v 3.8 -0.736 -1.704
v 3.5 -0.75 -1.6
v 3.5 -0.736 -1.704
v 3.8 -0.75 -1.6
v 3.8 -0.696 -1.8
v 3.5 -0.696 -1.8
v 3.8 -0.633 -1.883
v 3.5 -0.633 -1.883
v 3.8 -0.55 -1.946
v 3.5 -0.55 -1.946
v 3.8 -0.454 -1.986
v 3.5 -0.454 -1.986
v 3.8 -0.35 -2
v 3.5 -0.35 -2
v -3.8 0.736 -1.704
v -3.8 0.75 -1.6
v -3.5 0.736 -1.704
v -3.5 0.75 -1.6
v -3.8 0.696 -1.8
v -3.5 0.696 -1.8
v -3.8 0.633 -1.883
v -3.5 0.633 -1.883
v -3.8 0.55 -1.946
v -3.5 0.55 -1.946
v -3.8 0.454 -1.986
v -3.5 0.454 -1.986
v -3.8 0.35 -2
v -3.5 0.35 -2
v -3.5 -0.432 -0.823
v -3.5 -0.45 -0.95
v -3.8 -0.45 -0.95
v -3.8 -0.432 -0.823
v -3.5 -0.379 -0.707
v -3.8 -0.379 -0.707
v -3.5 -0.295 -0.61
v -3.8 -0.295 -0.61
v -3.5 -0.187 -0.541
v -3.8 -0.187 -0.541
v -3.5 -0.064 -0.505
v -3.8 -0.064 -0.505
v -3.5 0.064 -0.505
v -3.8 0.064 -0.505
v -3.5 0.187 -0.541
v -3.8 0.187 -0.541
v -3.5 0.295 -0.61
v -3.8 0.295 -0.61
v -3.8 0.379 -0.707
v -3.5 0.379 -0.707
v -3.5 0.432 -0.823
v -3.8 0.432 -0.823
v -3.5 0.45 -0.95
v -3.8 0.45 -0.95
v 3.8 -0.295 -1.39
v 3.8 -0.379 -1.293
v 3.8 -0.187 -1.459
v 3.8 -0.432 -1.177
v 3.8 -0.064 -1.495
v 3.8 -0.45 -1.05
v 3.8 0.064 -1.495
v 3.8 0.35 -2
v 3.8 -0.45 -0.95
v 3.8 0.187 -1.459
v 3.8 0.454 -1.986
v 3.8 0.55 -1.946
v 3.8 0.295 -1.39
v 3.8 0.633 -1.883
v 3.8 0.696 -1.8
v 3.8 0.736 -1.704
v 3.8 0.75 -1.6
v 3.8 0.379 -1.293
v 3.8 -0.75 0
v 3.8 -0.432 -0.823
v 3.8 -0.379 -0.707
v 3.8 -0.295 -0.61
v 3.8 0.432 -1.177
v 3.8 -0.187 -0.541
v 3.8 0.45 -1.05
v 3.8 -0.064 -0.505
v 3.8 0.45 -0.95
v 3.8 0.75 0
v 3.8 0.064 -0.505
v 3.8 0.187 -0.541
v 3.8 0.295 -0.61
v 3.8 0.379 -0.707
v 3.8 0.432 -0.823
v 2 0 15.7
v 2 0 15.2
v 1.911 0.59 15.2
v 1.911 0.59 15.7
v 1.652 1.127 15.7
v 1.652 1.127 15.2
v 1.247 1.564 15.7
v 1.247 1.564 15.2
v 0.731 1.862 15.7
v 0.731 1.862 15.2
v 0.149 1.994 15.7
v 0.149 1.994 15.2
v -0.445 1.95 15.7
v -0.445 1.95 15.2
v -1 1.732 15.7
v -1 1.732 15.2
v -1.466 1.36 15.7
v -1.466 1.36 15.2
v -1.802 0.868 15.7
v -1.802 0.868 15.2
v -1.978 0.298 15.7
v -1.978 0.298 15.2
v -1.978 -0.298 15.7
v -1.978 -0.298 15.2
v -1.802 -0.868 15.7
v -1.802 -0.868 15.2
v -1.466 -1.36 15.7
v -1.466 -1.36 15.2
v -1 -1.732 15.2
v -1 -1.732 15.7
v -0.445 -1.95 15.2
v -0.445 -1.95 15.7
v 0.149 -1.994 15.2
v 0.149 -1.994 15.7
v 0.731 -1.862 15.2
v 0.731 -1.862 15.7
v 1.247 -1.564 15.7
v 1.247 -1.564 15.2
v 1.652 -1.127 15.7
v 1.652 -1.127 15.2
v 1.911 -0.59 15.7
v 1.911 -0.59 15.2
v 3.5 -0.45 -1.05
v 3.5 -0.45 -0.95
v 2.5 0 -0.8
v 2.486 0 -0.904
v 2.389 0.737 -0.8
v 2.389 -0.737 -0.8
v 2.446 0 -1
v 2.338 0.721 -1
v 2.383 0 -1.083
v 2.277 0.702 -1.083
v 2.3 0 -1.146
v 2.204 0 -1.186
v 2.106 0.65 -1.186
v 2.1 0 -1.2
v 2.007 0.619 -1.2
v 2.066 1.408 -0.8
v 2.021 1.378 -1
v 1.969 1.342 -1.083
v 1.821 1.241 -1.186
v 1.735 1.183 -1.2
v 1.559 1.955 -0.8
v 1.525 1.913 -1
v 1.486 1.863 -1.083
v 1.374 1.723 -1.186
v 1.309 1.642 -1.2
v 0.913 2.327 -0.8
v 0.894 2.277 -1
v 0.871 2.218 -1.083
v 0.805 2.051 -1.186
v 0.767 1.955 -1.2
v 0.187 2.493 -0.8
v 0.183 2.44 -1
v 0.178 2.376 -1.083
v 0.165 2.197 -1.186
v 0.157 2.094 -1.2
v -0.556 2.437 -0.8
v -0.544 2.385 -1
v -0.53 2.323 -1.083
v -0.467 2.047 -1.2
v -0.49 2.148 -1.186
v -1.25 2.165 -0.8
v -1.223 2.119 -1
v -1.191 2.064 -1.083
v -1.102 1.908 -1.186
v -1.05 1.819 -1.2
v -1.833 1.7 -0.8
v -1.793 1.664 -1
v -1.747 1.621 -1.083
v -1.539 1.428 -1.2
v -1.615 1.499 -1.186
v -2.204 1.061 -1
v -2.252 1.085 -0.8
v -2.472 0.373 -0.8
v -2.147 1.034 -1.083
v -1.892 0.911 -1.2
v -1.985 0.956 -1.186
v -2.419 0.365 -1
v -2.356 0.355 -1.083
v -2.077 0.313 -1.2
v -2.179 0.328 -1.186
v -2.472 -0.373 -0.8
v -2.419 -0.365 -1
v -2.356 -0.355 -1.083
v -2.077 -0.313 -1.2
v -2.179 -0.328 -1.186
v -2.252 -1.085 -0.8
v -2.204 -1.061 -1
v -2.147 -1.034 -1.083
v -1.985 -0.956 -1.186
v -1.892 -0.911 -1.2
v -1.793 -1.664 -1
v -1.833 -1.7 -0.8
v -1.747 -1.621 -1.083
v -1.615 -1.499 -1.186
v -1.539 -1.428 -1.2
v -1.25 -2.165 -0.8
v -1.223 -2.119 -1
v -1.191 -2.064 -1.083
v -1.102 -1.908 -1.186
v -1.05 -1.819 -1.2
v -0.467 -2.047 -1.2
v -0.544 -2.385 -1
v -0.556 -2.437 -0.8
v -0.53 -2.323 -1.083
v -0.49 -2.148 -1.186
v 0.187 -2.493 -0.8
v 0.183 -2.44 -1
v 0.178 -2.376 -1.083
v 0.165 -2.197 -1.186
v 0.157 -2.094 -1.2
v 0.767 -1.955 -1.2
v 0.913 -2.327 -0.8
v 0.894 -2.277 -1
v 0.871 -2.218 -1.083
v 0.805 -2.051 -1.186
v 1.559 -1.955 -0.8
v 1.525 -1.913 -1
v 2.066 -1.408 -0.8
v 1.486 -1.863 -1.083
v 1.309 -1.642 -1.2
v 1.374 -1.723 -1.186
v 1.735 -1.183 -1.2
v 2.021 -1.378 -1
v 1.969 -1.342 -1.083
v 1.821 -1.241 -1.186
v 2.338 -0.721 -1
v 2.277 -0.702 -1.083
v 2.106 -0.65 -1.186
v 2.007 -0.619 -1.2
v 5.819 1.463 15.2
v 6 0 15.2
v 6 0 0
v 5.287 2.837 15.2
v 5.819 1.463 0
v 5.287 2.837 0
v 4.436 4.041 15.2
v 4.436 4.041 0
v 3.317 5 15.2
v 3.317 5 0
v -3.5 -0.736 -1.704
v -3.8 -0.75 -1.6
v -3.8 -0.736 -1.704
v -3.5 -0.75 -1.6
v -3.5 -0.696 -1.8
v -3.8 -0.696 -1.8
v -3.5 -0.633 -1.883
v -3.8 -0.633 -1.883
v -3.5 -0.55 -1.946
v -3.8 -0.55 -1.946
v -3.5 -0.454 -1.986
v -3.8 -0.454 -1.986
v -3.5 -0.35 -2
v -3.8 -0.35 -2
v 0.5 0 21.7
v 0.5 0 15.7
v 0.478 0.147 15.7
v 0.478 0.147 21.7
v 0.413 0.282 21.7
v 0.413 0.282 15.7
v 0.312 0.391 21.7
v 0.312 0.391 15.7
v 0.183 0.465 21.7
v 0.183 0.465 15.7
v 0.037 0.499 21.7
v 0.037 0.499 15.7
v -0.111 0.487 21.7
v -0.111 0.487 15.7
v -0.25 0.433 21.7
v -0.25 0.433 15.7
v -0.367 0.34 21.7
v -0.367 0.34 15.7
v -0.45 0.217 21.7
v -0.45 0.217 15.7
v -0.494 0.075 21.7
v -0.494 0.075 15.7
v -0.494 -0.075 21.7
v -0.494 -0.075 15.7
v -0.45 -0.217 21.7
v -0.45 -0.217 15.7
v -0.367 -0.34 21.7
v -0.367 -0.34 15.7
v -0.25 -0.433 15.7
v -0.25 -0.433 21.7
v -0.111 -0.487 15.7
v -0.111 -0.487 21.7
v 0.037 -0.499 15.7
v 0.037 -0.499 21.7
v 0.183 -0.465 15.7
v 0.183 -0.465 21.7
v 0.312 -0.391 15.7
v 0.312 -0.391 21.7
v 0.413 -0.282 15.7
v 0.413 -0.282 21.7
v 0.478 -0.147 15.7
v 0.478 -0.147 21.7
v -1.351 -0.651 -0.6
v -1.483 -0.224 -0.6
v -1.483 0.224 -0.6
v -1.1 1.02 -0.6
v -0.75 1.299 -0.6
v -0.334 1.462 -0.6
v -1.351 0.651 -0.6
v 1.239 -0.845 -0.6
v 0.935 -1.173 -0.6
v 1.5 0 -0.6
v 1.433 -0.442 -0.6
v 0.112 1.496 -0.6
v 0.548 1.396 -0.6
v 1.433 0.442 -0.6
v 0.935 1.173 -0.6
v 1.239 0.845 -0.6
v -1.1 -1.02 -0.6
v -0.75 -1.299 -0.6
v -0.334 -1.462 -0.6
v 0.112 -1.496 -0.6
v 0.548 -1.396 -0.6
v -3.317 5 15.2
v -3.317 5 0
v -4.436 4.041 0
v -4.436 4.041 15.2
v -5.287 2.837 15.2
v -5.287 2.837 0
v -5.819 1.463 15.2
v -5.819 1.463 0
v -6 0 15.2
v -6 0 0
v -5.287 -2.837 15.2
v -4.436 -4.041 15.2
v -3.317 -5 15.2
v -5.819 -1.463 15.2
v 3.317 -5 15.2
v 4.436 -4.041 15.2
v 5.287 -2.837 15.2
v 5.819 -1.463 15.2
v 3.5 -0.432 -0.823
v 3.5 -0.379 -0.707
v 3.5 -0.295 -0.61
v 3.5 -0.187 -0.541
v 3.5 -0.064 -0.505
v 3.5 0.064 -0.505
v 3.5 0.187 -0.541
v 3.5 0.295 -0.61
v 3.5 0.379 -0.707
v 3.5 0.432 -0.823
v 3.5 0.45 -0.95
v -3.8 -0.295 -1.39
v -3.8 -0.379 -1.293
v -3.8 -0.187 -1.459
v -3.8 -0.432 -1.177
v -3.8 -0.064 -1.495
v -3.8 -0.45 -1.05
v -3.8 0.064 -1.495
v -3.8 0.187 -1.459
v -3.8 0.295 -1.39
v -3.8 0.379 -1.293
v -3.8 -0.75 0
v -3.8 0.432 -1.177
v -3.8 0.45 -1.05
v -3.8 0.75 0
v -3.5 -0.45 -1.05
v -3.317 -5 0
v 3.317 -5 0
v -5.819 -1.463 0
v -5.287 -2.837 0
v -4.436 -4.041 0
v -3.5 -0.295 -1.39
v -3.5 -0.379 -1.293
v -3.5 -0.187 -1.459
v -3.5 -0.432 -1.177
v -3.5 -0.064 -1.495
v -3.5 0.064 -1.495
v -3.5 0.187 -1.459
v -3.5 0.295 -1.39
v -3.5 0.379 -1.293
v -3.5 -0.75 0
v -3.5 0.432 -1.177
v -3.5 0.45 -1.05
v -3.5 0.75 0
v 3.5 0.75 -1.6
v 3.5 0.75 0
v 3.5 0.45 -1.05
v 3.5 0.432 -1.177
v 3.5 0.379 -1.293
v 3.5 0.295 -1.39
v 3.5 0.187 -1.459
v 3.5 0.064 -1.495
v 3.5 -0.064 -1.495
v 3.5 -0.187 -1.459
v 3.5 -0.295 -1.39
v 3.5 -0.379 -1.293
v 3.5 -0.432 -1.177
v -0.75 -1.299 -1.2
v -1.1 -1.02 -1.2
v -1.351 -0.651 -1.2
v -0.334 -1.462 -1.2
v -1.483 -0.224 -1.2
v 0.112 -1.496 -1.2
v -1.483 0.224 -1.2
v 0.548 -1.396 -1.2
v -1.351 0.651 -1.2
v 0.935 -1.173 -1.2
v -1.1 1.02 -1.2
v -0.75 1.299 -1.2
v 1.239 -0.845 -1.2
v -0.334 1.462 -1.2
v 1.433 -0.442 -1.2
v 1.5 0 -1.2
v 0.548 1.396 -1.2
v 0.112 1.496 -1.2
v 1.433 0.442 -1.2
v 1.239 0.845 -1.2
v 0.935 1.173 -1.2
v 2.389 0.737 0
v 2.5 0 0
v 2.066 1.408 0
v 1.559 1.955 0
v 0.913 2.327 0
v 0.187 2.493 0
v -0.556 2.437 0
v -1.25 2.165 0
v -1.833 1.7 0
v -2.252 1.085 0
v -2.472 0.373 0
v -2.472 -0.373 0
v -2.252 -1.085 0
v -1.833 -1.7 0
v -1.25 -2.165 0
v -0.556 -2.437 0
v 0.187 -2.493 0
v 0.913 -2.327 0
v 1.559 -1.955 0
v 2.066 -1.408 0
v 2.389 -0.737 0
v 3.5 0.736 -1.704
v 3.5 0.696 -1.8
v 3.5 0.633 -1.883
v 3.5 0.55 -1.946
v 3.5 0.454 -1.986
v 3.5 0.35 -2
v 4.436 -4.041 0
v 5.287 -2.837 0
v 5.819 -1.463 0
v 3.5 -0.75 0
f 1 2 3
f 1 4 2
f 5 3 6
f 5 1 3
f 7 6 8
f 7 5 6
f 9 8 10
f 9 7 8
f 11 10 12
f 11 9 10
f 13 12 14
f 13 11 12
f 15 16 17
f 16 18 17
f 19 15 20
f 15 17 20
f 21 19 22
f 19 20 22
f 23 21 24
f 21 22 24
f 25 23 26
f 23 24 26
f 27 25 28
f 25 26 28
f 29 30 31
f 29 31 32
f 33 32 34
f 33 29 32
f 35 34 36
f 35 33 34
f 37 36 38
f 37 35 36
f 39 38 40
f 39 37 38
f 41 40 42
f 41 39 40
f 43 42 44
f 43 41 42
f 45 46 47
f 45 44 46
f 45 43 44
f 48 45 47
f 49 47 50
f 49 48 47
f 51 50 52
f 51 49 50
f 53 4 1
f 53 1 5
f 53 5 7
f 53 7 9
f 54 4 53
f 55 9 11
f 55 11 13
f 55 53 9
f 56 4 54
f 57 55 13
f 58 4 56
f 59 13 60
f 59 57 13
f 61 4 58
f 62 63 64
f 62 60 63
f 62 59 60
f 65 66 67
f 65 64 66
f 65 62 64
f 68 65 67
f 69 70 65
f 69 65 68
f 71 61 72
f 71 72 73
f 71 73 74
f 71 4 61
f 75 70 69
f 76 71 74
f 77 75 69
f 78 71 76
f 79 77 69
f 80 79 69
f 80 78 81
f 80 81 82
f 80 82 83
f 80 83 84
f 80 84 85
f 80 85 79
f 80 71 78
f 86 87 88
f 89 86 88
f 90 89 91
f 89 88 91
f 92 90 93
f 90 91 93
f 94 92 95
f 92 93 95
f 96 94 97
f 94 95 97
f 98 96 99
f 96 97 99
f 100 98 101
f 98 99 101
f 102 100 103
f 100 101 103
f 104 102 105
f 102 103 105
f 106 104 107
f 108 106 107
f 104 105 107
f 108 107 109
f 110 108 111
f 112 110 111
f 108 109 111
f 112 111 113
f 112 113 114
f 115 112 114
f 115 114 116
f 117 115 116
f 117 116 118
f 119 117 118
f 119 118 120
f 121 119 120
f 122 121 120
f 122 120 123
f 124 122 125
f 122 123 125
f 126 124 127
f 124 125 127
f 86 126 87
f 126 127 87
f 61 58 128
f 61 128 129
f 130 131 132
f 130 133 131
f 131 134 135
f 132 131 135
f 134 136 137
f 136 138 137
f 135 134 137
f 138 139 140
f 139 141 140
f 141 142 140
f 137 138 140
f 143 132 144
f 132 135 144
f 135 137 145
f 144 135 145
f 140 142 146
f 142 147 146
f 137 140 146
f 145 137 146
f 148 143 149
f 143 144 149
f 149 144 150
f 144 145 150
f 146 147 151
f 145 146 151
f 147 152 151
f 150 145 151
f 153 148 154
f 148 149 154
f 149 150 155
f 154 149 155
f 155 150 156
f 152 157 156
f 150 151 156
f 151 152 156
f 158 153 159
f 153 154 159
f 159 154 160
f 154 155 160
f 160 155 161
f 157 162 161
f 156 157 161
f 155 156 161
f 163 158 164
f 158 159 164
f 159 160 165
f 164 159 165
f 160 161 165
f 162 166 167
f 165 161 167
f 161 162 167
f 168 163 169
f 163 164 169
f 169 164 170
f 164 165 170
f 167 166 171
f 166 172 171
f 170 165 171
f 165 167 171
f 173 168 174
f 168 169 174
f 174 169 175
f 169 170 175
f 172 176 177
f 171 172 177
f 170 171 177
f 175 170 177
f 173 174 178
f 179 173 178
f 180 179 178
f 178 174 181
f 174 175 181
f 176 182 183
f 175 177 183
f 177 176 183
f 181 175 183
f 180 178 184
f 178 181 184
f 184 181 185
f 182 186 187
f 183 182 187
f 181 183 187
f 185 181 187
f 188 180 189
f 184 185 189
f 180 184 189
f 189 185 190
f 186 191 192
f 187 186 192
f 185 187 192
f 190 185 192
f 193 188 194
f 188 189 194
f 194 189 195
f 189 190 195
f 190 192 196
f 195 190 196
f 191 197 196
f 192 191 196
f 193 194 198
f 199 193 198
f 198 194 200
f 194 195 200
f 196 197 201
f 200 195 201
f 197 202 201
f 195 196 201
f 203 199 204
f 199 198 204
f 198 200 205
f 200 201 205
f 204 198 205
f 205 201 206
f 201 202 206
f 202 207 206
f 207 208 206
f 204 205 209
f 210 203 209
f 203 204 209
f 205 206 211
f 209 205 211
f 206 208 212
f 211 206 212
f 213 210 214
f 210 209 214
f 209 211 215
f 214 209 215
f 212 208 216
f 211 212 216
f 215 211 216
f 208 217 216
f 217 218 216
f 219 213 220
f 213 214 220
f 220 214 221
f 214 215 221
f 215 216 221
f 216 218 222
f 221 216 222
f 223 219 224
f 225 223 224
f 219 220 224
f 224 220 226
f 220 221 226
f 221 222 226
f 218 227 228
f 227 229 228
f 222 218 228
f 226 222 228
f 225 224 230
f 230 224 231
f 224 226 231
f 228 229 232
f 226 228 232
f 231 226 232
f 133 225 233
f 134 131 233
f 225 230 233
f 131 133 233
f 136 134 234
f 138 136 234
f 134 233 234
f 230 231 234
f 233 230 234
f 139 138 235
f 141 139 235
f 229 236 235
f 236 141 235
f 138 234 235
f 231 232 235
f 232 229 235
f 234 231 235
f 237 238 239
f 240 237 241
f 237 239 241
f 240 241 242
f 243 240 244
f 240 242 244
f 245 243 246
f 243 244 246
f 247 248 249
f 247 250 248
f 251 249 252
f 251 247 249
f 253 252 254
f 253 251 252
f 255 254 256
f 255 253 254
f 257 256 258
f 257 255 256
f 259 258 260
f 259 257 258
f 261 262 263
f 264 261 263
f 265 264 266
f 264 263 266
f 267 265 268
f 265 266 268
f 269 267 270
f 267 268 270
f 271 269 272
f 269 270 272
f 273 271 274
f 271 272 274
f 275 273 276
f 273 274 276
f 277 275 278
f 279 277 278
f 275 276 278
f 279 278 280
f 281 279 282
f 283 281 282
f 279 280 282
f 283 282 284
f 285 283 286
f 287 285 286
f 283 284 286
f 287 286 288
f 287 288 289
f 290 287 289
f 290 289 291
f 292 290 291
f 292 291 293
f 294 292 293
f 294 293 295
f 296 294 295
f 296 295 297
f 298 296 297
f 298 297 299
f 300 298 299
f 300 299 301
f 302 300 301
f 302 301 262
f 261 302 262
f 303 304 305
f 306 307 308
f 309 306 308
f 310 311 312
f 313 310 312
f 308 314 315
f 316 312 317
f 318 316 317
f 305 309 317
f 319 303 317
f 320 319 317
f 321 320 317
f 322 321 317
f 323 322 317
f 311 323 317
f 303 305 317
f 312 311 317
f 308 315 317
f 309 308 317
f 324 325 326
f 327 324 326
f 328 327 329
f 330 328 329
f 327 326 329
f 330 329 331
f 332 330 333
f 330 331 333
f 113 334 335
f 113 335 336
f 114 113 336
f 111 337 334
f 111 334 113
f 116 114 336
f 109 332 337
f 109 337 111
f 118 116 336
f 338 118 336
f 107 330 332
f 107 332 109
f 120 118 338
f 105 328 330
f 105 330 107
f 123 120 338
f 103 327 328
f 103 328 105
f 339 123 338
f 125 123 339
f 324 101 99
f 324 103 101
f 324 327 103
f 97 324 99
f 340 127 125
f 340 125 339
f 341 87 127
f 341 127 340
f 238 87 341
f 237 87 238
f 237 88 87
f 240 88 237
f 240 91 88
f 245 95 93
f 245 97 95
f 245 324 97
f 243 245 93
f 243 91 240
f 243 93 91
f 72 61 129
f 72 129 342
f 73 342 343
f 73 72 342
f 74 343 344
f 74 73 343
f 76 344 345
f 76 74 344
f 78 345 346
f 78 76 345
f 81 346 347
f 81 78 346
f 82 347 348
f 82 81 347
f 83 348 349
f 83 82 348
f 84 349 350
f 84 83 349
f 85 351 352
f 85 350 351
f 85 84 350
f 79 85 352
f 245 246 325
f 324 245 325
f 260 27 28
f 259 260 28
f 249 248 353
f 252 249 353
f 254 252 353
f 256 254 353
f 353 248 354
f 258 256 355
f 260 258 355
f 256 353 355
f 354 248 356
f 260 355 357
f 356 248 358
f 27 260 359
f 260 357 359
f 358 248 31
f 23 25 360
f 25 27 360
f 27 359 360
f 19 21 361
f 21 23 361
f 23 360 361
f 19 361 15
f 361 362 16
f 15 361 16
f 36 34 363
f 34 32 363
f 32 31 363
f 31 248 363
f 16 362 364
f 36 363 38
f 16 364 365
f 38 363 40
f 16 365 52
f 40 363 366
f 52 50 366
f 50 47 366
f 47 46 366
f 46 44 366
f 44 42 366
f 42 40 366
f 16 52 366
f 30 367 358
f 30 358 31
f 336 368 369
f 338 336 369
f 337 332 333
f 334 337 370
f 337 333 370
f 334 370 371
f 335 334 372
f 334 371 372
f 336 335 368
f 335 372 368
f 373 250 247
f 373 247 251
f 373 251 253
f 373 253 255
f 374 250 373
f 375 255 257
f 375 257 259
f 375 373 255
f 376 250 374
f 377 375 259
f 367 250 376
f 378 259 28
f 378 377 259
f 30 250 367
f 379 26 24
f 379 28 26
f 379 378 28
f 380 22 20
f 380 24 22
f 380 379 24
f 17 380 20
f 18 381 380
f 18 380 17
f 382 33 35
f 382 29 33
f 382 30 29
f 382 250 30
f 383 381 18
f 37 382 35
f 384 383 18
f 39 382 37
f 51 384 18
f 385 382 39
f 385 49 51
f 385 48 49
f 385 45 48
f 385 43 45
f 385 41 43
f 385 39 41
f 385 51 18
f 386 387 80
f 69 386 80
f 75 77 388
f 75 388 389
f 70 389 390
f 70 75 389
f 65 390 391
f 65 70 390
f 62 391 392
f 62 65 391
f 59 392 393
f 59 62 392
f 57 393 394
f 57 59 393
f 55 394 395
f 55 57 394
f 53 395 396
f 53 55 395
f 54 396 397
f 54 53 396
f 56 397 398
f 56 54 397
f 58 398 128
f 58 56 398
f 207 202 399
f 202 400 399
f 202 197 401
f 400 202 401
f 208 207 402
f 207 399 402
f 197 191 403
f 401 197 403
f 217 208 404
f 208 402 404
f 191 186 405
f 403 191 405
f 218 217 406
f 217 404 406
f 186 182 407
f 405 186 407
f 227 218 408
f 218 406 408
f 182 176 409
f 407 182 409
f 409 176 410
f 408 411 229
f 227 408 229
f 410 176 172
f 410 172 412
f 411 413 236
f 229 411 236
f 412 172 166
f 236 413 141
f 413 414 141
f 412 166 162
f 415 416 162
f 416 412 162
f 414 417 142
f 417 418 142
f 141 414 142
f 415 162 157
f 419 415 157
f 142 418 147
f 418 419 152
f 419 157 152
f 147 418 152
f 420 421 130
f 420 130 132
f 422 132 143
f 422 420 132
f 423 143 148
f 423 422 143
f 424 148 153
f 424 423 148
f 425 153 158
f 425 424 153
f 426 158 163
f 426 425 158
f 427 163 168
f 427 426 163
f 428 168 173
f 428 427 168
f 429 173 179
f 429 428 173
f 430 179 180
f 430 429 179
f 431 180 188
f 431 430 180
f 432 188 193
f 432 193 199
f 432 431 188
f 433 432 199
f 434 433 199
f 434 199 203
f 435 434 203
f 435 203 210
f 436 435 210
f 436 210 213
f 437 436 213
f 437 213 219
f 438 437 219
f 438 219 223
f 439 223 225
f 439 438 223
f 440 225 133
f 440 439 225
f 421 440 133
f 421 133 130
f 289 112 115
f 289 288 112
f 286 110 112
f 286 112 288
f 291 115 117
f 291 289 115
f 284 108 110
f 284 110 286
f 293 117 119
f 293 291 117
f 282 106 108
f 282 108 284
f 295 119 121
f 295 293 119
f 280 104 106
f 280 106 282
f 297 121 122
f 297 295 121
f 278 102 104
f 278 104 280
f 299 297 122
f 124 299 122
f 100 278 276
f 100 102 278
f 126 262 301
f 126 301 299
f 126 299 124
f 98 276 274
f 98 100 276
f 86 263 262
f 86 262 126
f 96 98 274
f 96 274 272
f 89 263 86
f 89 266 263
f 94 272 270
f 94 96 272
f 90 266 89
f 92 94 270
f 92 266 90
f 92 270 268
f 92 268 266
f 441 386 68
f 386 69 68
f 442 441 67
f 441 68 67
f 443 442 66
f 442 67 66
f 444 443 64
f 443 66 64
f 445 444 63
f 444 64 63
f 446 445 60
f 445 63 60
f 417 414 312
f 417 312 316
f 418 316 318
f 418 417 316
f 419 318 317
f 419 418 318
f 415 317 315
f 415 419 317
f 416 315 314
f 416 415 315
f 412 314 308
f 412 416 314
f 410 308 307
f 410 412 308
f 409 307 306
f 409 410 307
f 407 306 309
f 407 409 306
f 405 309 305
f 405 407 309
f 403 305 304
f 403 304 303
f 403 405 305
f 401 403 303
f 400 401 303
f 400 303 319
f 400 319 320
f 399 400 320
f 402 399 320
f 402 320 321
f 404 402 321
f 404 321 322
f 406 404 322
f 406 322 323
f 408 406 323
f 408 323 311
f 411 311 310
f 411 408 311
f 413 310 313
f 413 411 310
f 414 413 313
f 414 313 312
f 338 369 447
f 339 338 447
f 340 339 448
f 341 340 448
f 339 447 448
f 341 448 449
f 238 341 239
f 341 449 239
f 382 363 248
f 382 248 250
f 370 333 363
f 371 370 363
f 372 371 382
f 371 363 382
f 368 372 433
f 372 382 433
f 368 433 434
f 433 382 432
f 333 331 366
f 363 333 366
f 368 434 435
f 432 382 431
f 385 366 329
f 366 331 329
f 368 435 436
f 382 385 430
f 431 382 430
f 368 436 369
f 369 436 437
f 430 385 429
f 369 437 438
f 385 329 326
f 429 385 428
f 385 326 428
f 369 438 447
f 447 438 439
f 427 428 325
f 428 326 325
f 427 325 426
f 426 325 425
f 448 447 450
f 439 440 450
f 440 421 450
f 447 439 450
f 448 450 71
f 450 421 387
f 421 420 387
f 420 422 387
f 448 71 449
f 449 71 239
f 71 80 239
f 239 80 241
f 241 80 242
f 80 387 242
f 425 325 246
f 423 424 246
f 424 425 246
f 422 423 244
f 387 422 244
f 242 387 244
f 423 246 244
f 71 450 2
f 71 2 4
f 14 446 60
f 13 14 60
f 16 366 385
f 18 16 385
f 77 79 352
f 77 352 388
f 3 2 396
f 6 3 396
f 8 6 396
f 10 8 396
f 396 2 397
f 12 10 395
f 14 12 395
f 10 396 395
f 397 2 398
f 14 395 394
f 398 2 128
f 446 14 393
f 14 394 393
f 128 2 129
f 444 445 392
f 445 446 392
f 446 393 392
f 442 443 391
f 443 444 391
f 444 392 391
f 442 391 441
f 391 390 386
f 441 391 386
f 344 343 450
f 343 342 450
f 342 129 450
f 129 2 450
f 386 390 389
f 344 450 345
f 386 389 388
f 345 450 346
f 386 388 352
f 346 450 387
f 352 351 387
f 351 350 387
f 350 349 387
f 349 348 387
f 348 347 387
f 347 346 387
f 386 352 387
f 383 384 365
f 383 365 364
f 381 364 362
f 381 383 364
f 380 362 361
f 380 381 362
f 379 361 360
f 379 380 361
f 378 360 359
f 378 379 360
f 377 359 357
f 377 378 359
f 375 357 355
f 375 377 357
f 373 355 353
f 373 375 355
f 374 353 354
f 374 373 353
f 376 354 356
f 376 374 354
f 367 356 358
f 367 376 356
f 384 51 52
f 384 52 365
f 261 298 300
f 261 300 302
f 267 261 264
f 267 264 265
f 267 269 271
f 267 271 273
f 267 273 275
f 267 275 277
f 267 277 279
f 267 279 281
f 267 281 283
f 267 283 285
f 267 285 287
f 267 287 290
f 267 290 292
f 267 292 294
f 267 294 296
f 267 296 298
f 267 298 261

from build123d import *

# Parameters (mm, degrees)
SKETCH_1_W          = 0.3
SKETCH_1_H          = 1.5
SKETCH_1_R          = 2.5
SKETCH_1_R_2        = 1.5
EXTRUDE_1_DEPTH     = 15.2
SKETCH_1_4_W        = 0.3
SKETCH_1_4_H        = 1.5
EXTRUDE_2_DEPTH     = 2
CUT_EXTRUDE_2_DEPTH = 19.763794925
FILLET_1_R          = 0.4
SKETCH_1_5_R        = 2.5
SKETCH_1_5_R_2      = 1.5
EXTRUDE_3_DEPTH     = 1.2
CUT_EXTRUDE_START   = -1.2
SKETCH_1_7_R        = 1.5
CUT_EXTRUDE_1_DEPTH = 0.6
FILLET_2_R          = 0.4
SKETCH_3_R          = 2
EXTRUDE_4_DEPTH     = 0.5
SKETCH_3_3_R        = 0.5
EXTRUDE_5_DEPTH     = 6.5


with BuildPart() as part:
    # 草图1 → 凸台-拉伸1 (new body)
    # profile 1 of 5: a face of its own
    with BuildSketch(Plane.XY):
        with BuildLine():
            ThreePointArc((-6, 0), (-5.286764074, -2.837274331), (-3.31662479, -5))
            Line((-3.31662479, -5), (3.31662479, -5))
            ThreePointArc((3.31662479, -5), (5.286764074, -2.837274331), (6, 0))
            ThreePointArc((6, 0), (5.286764074, 2.837274331), (3.31662479, 5))
            Line((3.31662479, 5), (-3.31662479, 5))
            ThreePointArc((-3.31662479, 5), (-5.286764074, 2.837274331), (-6, 0))
        make_face()
        with Locations((-3.65, 0)):
            Rectangle(SKETCH_1_W, SKETCH_1_H, mode=Mode.SUBTRACT)
        Circle(SKETCH_1_R, mode=Mode.SUBTRACT)
        with Locations((3.65, 0)):
            Rectangle(SKETCH_1_W, SKETCH_1_H, mode=Mode.SUBTRACT)
    # profile 2 of 5: a face of its own
    with BuildSketch(Plane.XY):
        Circle(SKETCH_1_R)
        Circle(SKETCH_1_R_2, mode=Mode.SUBTRACT)
    # profile 3 of 5: a face of its own
    with BuildSketch(Plane.XY):
        Circle(SKETCH_1_R_2)
    # profile 4 of 5: a face of its own
    with BuildSketch(Plane.XY):
        with Locations((3.65, 0)):
            Rectangle(SKETCH_1_W, SKETCH_1_H)
    # profile 5 of 5: a face of its own
    with BuildSketch(Plane.XY):
        with Locations((-3.65, 0)):
            Rectangle(SKETCH_1_W, SKETCH_1_H)
    extrude(amount=EXTRUDE_1_DEPTH)

    # 草图1<4> → 凸台-拉伸2 (add)
    with BuildSketch(Plane.XY):
        with Locations((3.65, 0)):
            Rectangle(SKETCH_1_4_W, SKETCH_1_4_H)
        with Locations((-3.65, 0)):
            Rectangle(SKETCH_1_4_W, SKETCH_1_4_H)
    extrude(amount=-EXTRUDE_2_DEPTH)

    # 草图2 → 切除-拉伸2 (cut, through all)
    with BuildSketch(Plane(origin=(3.8, 0, 0), x_dir=(0, 0, -1), z_dir=(1, 0, 0))):
        with BuildLine():
            Line((0.95, 0.45), (1.05, 0.45))
            ThreePointArc((1.05, 0.45), (1.5, 0), (1.05, -0.45))
            Line((1.05, -0.45), (0.95, -0.45))
            ThreePointArc((0.95, -0.45), (0.5, 0), (0.95, 0.45))
        make_face()
    extrude(amount=-CUT_EXTRUDE_2_DEPTH, mode=Mode.SUBTRACT)

    # 圆角1
    fillet_1_edges = [part.edges().sort_by_distance(p)[0] for p in [
        (3.65, -0.75, -2),
        (3.65, 0.75, -2),
        (-3.65, -0.75, -2),
        (-3.65, 0.75, -2),
    ]]
    fillet(fillet_1_edges, radius=FILLET_1_R)

    # 草图1<5> → 凸台-拉伸3 (add)
    # profile 1 of 2: a face of its own
    with BuildSketch(Plane.XY):
        Circle(SKETCH_1_5_R)
        Circle(SKETCH_1_5_R_2, mode=Mode.SUBTRACT)
    # profile 2 of 2: a face of its own
    with BuildSketch(Plane.XY):
        Circle(SKETCH_1_5_R_2)
    extrude(amount=-EXTRUDE_3_DEPTH)

    # 草图1<7> → 切除-拉伸1 (cut)
    with BuildSketch(Plane.XY.offset(CUT_EXTRUDE_START)):
        Circle(SKETCH_1_7_R)
    extrude(amount=CUT_EXTRUDE_1_DEPTH, mode=Mode.SUBTRACT)

    # 圆角2
    fillet_2_edges = [part.edges().sort_by_distance(p)[0] for p in [
        (-2.5, 0, -1.2),
    ]]
    fillet(fillet_2_edges, radius=FILLET_2_R)

    # 草图3 → 凸台-拉伸4 (add)
    with BuildSketch(Plane.XY.offset(15.2)):
        Circle(SKETCH_3_R)
    extrude(amount=EXTRUDE_4_DEPTH)

    # 草图3<3> → 凸台-拉伸5 (add)
    with BuildSketch(Plane.XY.offset(15.2)):
        Circle(SKETCH_3_3_R)
    extrude(amount=EXTRUDE_5_DEPTH)


solid = part.part
